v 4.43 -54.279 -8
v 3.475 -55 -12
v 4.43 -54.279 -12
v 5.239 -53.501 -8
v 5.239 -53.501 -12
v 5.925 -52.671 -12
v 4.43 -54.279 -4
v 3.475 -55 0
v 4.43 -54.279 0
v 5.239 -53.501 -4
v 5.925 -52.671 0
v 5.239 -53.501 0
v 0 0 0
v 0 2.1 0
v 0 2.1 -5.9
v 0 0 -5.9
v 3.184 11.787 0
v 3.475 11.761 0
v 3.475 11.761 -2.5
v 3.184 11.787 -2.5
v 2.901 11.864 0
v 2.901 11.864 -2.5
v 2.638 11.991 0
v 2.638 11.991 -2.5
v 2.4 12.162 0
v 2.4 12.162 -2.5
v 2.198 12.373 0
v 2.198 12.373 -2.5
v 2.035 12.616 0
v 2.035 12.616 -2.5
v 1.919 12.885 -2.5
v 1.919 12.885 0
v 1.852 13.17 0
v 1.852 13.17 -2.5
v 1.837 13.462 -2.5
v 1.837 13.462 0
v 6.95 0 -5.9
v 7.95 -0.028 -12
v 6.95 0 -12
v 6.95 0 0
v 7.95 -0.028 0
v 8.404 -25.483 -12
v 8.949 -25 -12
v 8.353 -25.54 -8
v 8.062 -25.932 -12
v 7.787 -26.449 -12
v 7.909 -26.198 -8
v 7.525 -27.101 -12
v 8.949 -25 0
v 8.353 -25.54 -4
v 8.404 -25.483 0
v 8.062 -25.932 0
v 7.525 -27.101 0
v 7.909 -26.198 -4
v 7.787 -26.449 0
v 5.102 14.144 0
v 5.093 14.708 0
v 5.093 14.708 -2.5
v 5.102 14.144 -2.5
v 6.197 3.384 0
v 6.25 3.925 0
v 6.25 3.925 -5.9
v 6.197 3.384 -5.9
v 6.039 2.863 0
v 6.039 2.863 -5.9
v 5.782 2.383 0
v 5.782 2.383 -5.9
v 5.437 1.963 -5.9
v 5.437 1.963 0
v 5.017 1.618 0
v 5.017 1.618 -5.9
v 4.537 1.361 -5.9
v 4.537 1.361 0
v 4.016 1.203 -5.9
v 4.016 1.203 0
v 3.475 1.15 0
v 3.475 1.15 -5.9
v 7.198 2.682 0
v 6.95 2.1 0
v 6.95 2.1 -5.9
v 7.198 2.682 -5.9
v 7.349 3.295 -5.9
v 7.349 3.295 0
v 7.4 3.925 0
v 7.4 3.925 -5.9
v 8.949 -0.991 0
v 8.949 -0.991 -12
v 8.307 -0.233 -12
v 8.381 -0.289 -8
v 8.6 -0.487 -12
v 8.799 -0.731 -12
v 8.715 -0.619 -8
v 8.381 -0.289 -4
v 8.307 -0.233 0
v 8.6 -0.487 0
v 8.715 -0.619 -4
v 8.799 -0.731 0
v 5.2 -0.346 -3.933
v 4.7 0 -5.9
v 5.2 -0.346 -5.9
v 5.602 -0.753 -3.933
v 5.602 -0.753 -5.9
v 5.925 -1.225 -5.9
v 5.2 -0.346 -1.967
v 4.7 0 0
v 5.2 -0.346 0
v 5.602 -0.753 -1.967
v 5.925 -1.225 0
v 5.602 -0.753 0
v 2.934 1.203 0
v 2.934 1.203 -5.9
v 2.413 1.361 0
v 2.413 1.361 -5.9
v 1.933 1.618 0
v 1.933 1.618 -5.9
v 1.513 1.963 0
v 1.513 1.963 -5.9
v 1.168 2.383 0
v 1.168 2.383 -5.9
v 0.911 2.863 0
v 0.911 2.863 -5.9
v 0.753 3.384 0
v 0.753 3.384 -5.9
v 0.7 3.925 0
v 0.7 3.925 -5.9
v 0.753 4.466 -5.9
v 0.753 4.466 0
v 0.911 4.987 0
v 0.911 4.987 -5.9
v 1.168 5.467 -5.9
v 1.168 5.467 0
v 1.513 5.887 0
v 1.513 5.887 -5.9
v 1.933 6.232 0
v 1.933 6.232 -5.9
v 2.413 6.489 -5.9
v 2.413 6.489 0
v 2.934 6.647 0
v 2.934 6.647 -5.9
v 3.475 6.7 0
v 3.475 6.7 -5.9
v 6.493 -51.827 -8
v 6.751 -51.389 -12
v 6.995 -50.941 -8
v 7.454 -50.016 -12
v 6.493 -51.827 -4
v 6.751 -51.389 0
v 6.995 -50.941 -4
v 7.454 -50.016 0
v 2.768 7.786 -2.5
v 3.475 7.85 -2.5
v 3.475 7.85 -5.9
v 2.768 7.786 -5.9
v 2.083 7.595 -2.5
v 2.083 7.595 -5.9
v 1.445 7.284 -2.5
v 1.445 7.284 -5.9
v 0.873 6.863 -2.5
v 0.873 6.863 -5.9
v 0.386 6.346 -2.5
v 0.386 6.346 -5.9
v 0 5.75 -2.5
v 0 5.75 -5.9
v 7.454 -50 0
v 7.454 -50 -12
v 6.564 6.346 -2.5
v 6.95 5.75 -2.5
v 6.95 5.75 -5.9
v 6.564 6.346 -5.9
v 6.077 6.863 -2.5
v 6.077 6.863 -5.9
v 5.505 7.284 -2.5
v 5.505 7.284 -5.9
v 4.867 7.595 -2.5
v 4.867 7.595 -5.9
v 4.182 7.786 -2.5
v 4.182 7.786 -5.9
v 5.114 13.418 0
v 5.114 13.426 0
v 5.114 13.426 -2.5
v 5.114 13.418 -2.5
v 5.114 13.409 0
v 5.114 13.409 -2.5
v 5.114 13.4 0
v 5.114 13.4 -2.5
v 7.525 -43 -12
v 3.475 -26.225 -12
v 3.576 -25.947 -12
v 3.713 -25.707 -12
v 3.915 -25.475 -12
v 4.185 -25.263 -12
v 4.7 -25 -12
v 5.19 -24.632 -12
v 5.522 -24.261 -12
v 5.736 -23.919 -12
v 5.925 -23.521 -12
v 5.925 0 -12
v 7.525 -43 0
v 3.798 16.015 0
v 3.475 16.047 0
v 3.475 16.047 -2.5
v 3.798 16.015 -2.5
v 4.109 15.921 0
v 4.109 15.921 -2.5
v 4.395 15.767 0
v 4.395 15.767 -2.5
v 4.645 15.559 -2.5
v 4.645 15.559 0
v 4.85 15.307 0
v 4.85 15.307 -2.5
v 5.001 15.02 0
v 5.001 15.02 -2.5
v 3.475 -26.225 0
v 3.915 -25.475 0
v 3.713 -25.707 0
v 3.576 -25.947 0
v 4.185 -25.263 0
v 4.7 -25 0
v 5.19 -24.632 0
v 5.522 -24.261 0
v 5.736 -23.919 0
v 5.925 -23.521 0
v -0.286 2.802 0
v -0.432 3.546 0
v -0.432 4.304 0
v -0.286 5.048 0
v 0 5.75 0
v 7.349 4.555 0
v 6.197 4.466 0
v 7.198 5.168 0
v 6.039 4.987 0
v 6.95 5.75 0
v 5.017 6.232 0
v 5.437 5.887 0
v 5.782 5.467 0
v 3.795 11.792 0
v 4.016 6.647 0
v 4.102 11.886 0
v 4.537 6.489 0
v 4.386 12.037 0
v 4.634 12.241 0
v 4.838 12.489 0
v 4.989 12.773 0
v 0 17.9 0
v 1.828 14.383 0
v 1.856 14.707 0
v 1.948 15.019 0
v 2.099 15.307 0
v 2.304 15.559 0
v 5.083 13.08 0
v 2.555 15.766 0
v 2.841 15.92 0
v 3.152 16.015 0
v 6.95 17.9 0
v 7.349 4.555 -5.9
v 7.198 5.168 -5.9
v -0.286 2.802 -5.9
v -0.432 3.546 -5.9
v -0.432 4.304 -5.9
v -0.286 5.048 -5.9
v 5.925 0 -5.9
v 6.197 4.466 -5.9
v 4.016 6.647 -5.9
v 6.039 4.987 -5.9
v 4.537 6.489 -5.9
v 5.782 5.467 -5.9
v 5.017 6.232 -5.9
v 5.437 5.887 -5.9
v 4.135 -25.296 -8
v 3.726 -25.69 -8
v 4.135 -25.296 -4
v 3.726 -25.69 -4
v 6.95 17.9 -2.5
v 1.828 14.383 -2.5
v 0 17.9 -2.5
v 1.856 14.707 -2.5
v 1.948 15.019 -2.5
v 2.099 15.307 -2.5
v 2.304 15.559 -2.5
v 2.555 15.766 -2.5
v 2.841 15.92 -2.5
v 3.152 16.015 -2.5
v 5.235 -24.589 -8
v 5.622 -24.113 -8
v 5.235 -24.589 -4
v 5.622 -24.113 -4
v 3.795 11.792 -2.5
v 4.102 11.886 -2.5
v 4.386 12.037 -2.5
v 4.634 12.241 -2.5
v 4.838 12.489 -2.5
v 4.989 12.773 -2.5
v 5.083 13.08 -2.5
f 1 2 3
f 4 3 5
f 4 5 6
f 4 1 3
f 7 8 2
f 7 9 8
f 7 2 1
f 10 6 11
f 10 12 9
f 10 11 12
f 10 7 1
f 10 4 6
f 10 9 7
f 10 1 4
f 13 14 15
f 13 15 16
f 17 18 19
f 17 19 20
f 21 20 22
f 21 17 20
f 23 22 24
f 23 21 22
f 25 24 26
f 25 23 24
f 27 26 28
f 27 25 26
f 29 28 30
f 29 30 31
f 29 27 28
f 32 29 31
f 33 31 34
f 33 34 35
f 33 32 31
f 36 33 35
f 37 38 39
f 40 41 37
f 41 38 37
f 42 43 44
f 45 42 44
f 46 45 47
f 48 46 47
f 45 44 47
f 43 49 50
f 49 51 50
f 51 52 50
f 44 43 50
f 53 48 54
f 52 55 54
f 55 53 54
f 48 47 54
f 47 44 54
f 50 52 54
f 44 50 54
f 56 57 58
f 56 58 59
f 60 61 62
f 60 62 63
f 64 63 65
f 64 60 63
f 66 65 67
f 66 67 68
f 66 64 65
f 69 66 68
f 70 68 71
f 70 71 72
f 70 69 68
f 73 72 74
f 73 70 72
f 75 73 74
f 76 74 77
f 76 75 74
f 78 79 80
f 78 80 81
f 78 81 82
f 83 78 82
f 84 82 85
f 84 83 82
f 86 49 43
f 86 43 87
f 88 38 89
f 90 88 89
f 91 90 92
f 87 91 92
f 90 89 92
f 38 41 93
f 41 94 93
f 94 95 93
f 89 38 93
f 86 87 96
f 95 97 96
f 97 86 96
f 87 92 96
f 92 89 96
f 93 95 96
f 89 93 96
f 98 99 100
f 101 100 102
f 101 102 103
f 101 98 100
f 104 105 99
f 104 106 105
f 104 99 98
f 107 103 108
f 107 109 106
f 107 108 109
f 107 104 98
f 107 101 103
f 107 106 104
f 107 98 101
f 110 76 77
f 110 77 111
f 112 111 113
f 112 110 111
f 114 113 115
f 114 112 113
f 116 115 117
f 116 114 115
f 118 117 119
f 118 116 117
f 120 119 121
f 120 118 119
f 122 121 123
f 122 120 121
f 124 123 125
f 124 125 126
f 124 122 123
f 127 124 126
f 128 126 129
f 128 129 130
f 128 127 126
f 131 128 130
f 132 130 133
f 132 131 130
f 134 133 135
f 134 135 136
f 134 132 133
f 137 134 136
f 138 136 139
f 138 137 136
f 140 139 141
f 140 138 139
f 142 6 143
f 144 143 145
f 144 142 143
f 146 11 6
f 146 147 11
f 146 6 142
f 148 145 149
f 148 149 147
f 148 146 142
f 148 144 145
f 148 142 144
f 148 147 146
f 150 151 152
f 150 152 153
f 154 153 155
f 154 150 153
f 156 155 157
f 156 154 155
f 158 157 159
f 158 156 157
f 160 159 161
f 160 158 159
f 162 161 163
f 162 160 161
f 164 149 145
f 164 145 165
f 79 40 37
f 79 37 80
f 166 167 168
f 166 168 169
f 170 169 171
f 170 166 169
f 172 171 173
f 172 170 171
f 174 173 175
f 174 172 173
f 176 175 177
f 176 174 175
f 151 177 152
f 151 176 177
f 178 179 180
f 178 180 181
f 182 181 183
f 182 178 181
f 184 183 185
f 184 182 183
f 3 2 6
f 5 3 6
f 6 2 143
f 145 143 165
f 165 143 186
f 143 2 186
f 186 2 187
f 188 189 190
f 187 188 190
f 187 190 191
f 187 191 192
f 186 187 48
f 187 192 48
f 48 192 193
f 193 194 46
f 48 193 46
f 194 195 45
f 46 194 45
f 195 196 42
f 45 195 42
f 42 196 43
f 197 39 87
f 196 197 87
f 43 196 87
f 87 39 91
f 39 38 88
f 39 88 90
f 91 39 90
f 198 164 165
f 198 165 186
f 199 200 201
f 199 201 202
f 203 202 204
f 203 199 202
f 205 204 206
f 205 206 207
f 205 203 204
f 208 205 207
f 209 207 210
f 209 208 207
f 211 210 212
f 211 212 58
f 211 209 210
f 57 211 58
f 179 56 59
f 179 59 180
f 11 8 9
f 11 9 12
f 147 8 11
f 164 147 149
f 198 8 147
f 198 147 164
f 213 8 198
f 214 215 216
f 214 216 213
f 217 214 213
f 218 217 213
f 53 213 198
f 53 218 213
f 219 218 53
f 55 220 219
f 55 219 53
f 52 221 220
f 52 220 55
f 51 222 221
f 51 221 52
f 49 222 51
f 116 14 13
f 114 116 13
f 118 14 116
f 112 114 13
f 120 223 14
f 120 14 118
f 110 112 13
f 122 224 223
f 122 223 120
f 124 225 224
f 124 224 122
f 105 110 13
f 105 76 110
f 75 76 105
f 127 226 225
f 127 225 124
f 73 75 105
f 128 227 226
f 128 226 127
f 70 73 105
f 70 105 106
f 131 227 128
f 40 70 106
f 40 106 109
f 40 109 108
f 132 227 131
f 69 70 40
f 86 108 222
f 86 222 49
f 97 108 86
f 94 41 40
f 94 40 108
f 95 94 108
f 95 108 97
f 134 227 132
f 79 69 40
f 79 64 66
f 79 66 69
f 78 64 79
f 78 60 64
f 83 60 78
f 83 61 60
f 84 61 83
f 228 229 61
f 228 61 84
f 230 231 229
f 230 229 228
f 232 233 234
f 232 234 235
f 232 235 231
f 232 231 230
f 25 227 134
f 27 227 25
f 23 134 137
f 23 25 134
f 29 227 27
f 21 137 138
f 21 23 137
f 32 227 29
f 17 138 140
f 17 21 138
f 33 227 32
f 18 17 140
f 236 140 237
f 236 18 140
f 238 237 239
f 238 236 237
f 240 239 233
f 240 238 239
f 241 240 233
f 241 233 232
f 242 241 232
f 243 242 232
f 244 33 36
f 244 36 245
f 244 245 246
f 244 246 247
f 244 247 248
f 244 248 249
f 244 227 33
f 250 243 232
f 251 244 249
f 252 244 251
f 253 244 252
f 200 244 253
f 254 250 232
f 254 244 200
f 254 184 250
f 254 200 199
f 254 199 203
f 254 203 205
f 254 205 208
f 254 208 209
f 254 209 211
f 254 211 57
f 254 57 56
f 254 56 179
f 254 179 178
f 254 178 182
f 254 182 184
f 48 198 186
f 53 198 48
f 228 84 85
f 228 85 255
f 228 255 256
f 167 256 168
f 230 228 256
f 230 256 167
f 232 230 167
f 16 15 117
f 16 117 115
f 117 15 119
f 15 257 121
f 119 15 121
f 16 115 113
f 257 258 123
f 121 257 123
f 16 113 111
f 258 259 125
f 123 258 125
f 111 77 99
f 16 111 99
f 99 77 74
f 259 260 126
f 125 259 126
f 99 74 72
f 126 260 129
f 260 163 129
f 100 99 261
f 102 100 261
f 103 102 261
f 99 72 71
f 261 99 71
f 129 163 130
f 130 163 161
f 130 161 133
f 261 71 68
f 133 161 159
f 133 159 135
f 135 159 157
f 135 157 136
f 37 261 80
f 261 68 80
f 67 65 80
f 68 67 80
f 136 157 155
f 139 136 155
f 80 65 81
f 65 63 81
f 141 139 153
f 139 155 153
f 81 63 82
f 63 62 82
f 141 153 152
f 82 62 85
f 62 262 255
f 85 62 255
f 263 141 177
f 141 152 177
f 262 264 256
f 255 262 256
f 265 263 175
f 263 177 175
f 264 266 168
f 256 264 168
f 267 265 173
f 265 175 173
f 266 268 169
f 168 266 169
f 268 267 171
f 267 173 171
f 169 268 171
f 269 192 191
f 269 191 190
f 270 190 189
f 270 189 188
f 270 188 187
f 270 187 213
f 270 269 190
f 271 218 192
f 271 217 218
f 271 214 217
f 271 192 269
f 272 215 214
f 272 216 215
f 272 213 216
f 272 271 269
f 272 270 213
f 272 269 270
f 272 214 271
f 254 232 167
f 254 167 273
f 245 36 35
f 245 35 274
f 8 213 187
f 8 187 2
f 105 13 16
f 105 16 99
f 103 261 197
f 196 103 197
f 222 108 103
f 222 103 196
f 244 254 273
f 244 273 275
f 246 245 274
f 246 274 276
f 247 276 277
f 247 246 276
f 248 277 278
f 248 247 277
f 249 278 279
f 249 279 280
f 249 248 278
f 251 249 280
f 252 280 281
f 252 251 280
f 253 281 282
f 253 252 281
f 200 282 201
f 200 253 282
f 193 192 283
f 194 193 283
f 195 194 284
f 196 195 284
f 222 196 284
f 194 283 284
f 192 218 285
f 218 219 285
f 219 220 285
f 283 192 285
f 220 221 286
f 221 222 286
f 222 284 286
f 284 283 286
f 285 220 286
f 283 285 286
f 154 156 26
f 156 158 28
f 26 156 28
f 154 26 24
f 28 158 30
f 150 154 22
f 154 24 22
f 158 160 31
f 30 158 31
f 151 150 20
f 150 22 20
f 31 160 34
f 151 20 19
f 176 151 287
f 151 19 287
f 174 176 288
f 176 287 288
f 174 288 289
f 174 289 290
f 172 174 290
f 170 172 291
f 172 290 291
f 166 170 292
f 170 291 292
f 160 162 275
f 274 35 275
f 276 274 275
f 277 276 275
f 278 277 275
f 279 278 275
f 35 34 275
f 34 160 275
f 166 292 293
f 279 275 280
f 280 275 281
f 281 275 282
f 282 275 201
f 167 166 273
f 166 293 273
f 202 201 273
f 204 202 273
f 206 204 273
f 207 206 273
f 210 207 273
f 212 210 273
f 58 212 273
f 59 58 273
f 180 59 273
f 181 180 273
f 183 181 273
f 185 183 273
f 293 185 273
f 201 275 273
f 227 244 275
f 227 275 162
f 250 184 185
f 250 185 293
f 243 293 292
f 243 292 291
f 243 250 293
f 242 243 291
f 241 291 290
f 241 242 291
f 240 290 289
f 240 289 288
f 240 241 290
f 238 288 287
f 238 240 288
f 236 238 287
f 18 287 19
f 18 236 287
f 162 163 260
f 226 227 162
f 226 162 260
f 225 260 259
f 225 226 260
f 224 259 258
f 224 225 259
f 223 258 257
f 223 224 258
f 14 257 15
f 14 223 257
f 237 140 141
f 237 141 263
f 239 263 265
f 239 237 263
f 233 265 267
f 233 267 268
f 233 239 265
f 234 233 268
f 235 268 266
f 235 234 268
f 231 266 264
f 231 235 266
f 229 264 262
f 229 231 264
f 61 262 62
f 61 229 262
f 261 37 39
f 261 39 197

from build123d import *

# Parameters (mm, degrees)
F1_DEPTH = 5.9
F2_DEPTH = 2.5
F3_DEPTH = 12
F4_DEPTH = 12


with BuildPart() as f1:
    # F0 (on Top) → F1 (new body)
    with BuildSketch(Plane.XY):
        with BuildLine():
            Line((0, 2.1001712409), (0, 0))
            Line((0, 0), (1.025, 0))
            Line((1.025, 0), (1.025, 0.8585484677))
            ThreePointArc((1.025, 0.8585484677), (0.4481513041, 1.426237912), (0, 2.1001712409))
        make_face()
        with BuildLine():
            Line((1.025, 0.8585484677), (1.025, 0))
            Line((1.025, 0), (3.475, 0))
            ThreePointArc((3.475, 0), (2.1769624937, 0.2208504846), (1.025, 0.8585484677))
        make_face()
        with BuildLine():
            ThreePointArc((0, 5.7498287591), (-0.45, 3.925), (0, 2.1001712409))
            Line((0, 2.1001712409), (0, 5.7498287591))
        make_face()
        with BuildLine():
            Line((0, 5.7498287591), (0, 2.1001712409))
            ThreePointArc((0, 2.1001712409), (0.4481513041, 1.426237912), (1.025, 0.8585484677))
            ThreePointArc((1.025, 0.8585484677), (2.1769624937, 0.2208504846), (3.475, 0))
            Line((3.475, 0), (3.475, 1.15))
            ThreePointArc((3.475, 1.15), (0.7, 3.925), (3.475, 6.7))
            Line((3.475, 6.7), (3.475, 6.8908035755))
            Line((3.475, 6.8908035755), (3.475, 7.85))
            ThreePointArc((3.475, 7.85), (1.4448310267, 7.2841723593), (0, 5.7498287591))
        make_face()
        with BuildLine():
            ThreePointArc((5.925, 0.8585484677), (4.7730375063, 0.2208504846), (3.475, 0))
            Line((3.475, 0), (4.7, 0))
            Line((4.7, 0), (5.925, 0))
            Line((5.925, 0), (5.925, 0.8585484677))
        make_face()
        with BuildLine():
            Line((3.475, 1.15), (3.475, 0))
            ThreePointArc((3.475, 0), (4.7730375063, 0.2208504846), (5.925, 0.8585484677))
            ThreePointArc((5.925, 0.8585484677), (6.5018486959, 1.426237912), (6.95, 2.1001712409))
            Line((6.95, 2.1001712409), (6.95, 5.7498287591))
            ThreePointArc((6.95, 5.7498287591), (5.5051689733, 7.2841723593), (3.475, 7.85))
            Line((3.475, 7.85), (3.475, 6.8908035755))
            Line((3.475, 6.8908035755), (3.475, 6.7))
            ThreePointArc((3.475, 6.7), (5.4372213178, 5.8872213178), (6.25, 3.925))
            ThreePointArc((6.25, 3.925), (5.4372213178, 1.9627786822), (3.475, 1.15))
        make_face()
        with BuildLine():
            Line((5.925, 0), (4.7, 0))
            add(Edge.make_bspline(
                [(4.7, 0), (5.2537494339, -0.3164176305), (5.6369397789, -0.7196032093), (5.925, -1.225)],
                knots=[0, 0, 0, 0, 1.7324116139, 1.7324116139, 1.7324116139, 1.7324116139], degree=3))
            Line((5.925, -1.225), (5.925, -0.079424061))
            Line((5.925, -0.079424061), (5.925, 0))
        make_face()
        with BuildLine():
            ThreePointArc((6.95, 2.1001712409), (6.5018486959, 1.426237912), (5.925, 0.8585484677))
            Line((5.925, 0.8585484677), (5.925, 0))
            Line((5.925, 0), (6.95, 0))
            Line((6.95, 0), (6.95, 0.75))
            Line((6.95, 0.75), (6.95, 1.44))
            Line((6.95, 1.44), (6.95, 1.5))
            Line((6.95, 1.5), (6.95, 2.1001712409))
        make_face()
        with BuildLine():
            Line((6.95, 5.7498287591), (6.95, 2.1001712409))
            ThreePointArc((6.95, 2.1001712409), (7.2858398025, 2.9852526935), (7.4, 3.925))
            ThreePointArc((7.4, 3.925), (7.2858398025, 4.8647473065), (6.95, 5.7498287591))
        make_face()
    extrude(amount=-F1_DEPTH)

    # F0 (on Top) → F2 (join)
    with BuildSketch(Plane.XY):
        with BuildLine():
            Line((0, 7.85), (0, 5.7498287591))
            ThreePointArc((0, 5.7498287591), (1.4448310267, 7.2841723593), (3.475, 7.85))
            ThreePointArc((3.475, 7.85), (5.5051689733, 7.2841723593), (6.95, 5.7498287591))
            Line((6.95, 5.7498287591), (6.95, 17.9))
            Line((6.95, 17.9), (3.475, 17.9))
            Line((3.475, 17.9), (0, 17.9))
            Line((0, 17.9), (0, 7.85))
        make_face()
        with BuildLine():
            ThreePointArc((1.8276640256, 14.3833613398), (2.3042302705, 15.55900427), (3.475, 16.0474200003))
            ThreePointArc((3.475, 16.0474200003), (4.5253988967, 15.6691157612), (5.0933824344, 14.7079463483))
            Line((5.0933824344, 14.7079463483), (5.1024433757, 14.1442252627))
            Line((5.1024433757, 14.1442252627), (5.113982201, 13.4263440945))
            ThreePointArc((5.113982201, 13.4263440945), (5.1141409801, 13.4131724726), (5.1141939076, 13.4))
            ThreePointArc((5.1141939076, 13.4), (4.6340851277, 12.2409148723), (3.475, 11.7608060924))
            ThreePointArc((3.475, 11.7608060924), (2.2942628451, 12.2629791393), (1.8369719791, 13.4618131819))
            Line((1.8369719791, 13.4618131819), (1.8276640256, 14.3833613398))
        make_face(mode=Mode.SUBTRACT)
    extrude(amount=-F2_DEPTH)

    # F0 (on Top) → F3 (join)
    with BuildSketch(Plane.XY):
        with BuildLine():
            Line((6.95, 0), (5.925, 0))
            Line((5.925, 0), (5.925, -0.079424061))
            Line((5.925, -0.079424061), (5.925, -1.225))
            Line((5.925, -1.225), (5.925, -21.3844068348))
            Line((5.925, -21.3844068348), (5.925, -22.55))
            Line((5.925, -22.55), (5.925, -22.9875))
            Line((5.925, -22.9875), (5.925, -23.5205553472))
            Line((5.925, -23.5205553472), (5.925, -25))
            Line((5.925, -25), (7.525, -25))
            Line((7.525, -25), (8.9492390995, -25))
            Line((8.9492390995, -25), (8.9492390995, -0.9913714603))
            add(Edge.make_bspline(
                [(7.9496195498, -0.0275818011), (8.4295123816, -0.2455351059), (8.7658986449, -0.6068330258), (8.9492390995, -0.9913714603)],
                knots=[0, 0, 0, 0, 1.3885711186, 1.3885711186, 1.3885711186, 1.3885711186], degree=3))
            Line((7.9496195498, -0.0275818011), (6.95, 0))
        make_face()
        with BuildLine():
            add(Edge.make_bspline(
                [(4.7, -25), (4.0586842224, -25.2618398517), (3.6450892221, -25.6055109203), (3.475, -26.225)],
                knots=[0, 0, 0, 0, 1.7324116139, 1.7324116139, 1.7324116139, 1.7324116139], degree=3))
            Line((3.475, -26.225), (3.475, -48.775))
            Line((3.475, -48.775), (3.475, -50))
            Line((3.475, -50), (5.925, -50))
            Line((5.925, -50), (5.925, -47.55))
            Line((5.925, -47.55), (5.925, -43))
            Line((5.925, -43), (5.925, -28.903))
            Line((5.925, -28.903), (5.925, -26.9515))
            Line((5.925, -26.9515), (5.925, -25))
            Line((5.925, -25), (4.7, -25))
        make_face()
        with BuildLine():
            add(Edge.make_bspline(
                [(4.7, -25), (5.3314492106, -24.6048551053), (5.6424522772, -24.1878218949), (5.925, -23.5205553472)],
                knots=[0, 0, 0, 0, 1.9207762703, 1.9207762703, 1.9207762703, 1.9207762703], degree=3))
            Line((4.7, -25), (5.925, -25))
            Line((5.925, -25), (5.925, -23.5205553472))
        make_face()
        Polygon((7.525, -25), (5.925, -25), (5.925, -26.9515), (5.925, -28.903), (5.925, -43), (7.525, -43), (7.525, -27.1006729454), align=None)
        with BuildLine():
            add(Edge.make_bspline(
                [(8.9492390995, -25), (8.2447035238, -25.5232192576), (7.9111177474, -26.03264153), (7.525, -27.1006729454)],
                knots=[0, 0, 0, 0, 2.5379684466, 2.5379684466, 2.5379684466, 2.5379684466], degree=3))
            Line((8.9492390995, -25), (7.525, -25))
            Line((7.525, -25), (7.525, -27.1006729454))
        make_face()
        with BuildLine():
            Line((5.925, -50), (3.475, -50))
            Line((3.475, -50), (3.475, -55))
            add(Edge.make_bspline(
                [(3.475, -55), (4.512583722, -54.3078648135), (5.2908616095, -53.5264365704), (5.925, -52.6706067544)],
                knots=[0, 0, 0, 0, 3.2551675464, 3.2551675464, 3.2551675464, 3.2551675464], degree=3))
            Line((5.925, -52.6706067544), (5.925, -52.0125))
            Line((5.925, -52.0125), (5.925, -50))
        make_face()
        with BuildLine():
            Line((7.4536274492, -50.0155514561), (5.925, -50))
            Line((5.925, -50), (5.925, -52.0125))
            Line((5.925, -52.0125), (5.925, -52.6706067544))
            add(Edge.make_bspline(
                [(5.925, -52.6706067544), (6.5332867434, -51.8496661845), (7.0089465882, -50.9602665865), (7.4536274492, -50.0155514561)],
                knots=[3.2551675464, 3.2551675464, 3.2551675464, 3.2551675464, 6.3776330772, 6.3776330772, 6.3776330772, 6.3776330772], degree=3))
        make_face()
        Polygon((5.925, -47.55), (5.925, -50), (7.4537856616, -50), (7.525, -43), (5.925, -43), align=None)
    extrude(amount=-F3_DEPTH)

    # F0 (on Top) → F4 (join)
    with BuildSketch(Plane.XY):
        Polygon((7.4537856616, -50), (5.925, -50), (7.4536274492, -50.0155514561), align=None)
    extrude(amount=-F4_DEPTH)


solid = f1.part
